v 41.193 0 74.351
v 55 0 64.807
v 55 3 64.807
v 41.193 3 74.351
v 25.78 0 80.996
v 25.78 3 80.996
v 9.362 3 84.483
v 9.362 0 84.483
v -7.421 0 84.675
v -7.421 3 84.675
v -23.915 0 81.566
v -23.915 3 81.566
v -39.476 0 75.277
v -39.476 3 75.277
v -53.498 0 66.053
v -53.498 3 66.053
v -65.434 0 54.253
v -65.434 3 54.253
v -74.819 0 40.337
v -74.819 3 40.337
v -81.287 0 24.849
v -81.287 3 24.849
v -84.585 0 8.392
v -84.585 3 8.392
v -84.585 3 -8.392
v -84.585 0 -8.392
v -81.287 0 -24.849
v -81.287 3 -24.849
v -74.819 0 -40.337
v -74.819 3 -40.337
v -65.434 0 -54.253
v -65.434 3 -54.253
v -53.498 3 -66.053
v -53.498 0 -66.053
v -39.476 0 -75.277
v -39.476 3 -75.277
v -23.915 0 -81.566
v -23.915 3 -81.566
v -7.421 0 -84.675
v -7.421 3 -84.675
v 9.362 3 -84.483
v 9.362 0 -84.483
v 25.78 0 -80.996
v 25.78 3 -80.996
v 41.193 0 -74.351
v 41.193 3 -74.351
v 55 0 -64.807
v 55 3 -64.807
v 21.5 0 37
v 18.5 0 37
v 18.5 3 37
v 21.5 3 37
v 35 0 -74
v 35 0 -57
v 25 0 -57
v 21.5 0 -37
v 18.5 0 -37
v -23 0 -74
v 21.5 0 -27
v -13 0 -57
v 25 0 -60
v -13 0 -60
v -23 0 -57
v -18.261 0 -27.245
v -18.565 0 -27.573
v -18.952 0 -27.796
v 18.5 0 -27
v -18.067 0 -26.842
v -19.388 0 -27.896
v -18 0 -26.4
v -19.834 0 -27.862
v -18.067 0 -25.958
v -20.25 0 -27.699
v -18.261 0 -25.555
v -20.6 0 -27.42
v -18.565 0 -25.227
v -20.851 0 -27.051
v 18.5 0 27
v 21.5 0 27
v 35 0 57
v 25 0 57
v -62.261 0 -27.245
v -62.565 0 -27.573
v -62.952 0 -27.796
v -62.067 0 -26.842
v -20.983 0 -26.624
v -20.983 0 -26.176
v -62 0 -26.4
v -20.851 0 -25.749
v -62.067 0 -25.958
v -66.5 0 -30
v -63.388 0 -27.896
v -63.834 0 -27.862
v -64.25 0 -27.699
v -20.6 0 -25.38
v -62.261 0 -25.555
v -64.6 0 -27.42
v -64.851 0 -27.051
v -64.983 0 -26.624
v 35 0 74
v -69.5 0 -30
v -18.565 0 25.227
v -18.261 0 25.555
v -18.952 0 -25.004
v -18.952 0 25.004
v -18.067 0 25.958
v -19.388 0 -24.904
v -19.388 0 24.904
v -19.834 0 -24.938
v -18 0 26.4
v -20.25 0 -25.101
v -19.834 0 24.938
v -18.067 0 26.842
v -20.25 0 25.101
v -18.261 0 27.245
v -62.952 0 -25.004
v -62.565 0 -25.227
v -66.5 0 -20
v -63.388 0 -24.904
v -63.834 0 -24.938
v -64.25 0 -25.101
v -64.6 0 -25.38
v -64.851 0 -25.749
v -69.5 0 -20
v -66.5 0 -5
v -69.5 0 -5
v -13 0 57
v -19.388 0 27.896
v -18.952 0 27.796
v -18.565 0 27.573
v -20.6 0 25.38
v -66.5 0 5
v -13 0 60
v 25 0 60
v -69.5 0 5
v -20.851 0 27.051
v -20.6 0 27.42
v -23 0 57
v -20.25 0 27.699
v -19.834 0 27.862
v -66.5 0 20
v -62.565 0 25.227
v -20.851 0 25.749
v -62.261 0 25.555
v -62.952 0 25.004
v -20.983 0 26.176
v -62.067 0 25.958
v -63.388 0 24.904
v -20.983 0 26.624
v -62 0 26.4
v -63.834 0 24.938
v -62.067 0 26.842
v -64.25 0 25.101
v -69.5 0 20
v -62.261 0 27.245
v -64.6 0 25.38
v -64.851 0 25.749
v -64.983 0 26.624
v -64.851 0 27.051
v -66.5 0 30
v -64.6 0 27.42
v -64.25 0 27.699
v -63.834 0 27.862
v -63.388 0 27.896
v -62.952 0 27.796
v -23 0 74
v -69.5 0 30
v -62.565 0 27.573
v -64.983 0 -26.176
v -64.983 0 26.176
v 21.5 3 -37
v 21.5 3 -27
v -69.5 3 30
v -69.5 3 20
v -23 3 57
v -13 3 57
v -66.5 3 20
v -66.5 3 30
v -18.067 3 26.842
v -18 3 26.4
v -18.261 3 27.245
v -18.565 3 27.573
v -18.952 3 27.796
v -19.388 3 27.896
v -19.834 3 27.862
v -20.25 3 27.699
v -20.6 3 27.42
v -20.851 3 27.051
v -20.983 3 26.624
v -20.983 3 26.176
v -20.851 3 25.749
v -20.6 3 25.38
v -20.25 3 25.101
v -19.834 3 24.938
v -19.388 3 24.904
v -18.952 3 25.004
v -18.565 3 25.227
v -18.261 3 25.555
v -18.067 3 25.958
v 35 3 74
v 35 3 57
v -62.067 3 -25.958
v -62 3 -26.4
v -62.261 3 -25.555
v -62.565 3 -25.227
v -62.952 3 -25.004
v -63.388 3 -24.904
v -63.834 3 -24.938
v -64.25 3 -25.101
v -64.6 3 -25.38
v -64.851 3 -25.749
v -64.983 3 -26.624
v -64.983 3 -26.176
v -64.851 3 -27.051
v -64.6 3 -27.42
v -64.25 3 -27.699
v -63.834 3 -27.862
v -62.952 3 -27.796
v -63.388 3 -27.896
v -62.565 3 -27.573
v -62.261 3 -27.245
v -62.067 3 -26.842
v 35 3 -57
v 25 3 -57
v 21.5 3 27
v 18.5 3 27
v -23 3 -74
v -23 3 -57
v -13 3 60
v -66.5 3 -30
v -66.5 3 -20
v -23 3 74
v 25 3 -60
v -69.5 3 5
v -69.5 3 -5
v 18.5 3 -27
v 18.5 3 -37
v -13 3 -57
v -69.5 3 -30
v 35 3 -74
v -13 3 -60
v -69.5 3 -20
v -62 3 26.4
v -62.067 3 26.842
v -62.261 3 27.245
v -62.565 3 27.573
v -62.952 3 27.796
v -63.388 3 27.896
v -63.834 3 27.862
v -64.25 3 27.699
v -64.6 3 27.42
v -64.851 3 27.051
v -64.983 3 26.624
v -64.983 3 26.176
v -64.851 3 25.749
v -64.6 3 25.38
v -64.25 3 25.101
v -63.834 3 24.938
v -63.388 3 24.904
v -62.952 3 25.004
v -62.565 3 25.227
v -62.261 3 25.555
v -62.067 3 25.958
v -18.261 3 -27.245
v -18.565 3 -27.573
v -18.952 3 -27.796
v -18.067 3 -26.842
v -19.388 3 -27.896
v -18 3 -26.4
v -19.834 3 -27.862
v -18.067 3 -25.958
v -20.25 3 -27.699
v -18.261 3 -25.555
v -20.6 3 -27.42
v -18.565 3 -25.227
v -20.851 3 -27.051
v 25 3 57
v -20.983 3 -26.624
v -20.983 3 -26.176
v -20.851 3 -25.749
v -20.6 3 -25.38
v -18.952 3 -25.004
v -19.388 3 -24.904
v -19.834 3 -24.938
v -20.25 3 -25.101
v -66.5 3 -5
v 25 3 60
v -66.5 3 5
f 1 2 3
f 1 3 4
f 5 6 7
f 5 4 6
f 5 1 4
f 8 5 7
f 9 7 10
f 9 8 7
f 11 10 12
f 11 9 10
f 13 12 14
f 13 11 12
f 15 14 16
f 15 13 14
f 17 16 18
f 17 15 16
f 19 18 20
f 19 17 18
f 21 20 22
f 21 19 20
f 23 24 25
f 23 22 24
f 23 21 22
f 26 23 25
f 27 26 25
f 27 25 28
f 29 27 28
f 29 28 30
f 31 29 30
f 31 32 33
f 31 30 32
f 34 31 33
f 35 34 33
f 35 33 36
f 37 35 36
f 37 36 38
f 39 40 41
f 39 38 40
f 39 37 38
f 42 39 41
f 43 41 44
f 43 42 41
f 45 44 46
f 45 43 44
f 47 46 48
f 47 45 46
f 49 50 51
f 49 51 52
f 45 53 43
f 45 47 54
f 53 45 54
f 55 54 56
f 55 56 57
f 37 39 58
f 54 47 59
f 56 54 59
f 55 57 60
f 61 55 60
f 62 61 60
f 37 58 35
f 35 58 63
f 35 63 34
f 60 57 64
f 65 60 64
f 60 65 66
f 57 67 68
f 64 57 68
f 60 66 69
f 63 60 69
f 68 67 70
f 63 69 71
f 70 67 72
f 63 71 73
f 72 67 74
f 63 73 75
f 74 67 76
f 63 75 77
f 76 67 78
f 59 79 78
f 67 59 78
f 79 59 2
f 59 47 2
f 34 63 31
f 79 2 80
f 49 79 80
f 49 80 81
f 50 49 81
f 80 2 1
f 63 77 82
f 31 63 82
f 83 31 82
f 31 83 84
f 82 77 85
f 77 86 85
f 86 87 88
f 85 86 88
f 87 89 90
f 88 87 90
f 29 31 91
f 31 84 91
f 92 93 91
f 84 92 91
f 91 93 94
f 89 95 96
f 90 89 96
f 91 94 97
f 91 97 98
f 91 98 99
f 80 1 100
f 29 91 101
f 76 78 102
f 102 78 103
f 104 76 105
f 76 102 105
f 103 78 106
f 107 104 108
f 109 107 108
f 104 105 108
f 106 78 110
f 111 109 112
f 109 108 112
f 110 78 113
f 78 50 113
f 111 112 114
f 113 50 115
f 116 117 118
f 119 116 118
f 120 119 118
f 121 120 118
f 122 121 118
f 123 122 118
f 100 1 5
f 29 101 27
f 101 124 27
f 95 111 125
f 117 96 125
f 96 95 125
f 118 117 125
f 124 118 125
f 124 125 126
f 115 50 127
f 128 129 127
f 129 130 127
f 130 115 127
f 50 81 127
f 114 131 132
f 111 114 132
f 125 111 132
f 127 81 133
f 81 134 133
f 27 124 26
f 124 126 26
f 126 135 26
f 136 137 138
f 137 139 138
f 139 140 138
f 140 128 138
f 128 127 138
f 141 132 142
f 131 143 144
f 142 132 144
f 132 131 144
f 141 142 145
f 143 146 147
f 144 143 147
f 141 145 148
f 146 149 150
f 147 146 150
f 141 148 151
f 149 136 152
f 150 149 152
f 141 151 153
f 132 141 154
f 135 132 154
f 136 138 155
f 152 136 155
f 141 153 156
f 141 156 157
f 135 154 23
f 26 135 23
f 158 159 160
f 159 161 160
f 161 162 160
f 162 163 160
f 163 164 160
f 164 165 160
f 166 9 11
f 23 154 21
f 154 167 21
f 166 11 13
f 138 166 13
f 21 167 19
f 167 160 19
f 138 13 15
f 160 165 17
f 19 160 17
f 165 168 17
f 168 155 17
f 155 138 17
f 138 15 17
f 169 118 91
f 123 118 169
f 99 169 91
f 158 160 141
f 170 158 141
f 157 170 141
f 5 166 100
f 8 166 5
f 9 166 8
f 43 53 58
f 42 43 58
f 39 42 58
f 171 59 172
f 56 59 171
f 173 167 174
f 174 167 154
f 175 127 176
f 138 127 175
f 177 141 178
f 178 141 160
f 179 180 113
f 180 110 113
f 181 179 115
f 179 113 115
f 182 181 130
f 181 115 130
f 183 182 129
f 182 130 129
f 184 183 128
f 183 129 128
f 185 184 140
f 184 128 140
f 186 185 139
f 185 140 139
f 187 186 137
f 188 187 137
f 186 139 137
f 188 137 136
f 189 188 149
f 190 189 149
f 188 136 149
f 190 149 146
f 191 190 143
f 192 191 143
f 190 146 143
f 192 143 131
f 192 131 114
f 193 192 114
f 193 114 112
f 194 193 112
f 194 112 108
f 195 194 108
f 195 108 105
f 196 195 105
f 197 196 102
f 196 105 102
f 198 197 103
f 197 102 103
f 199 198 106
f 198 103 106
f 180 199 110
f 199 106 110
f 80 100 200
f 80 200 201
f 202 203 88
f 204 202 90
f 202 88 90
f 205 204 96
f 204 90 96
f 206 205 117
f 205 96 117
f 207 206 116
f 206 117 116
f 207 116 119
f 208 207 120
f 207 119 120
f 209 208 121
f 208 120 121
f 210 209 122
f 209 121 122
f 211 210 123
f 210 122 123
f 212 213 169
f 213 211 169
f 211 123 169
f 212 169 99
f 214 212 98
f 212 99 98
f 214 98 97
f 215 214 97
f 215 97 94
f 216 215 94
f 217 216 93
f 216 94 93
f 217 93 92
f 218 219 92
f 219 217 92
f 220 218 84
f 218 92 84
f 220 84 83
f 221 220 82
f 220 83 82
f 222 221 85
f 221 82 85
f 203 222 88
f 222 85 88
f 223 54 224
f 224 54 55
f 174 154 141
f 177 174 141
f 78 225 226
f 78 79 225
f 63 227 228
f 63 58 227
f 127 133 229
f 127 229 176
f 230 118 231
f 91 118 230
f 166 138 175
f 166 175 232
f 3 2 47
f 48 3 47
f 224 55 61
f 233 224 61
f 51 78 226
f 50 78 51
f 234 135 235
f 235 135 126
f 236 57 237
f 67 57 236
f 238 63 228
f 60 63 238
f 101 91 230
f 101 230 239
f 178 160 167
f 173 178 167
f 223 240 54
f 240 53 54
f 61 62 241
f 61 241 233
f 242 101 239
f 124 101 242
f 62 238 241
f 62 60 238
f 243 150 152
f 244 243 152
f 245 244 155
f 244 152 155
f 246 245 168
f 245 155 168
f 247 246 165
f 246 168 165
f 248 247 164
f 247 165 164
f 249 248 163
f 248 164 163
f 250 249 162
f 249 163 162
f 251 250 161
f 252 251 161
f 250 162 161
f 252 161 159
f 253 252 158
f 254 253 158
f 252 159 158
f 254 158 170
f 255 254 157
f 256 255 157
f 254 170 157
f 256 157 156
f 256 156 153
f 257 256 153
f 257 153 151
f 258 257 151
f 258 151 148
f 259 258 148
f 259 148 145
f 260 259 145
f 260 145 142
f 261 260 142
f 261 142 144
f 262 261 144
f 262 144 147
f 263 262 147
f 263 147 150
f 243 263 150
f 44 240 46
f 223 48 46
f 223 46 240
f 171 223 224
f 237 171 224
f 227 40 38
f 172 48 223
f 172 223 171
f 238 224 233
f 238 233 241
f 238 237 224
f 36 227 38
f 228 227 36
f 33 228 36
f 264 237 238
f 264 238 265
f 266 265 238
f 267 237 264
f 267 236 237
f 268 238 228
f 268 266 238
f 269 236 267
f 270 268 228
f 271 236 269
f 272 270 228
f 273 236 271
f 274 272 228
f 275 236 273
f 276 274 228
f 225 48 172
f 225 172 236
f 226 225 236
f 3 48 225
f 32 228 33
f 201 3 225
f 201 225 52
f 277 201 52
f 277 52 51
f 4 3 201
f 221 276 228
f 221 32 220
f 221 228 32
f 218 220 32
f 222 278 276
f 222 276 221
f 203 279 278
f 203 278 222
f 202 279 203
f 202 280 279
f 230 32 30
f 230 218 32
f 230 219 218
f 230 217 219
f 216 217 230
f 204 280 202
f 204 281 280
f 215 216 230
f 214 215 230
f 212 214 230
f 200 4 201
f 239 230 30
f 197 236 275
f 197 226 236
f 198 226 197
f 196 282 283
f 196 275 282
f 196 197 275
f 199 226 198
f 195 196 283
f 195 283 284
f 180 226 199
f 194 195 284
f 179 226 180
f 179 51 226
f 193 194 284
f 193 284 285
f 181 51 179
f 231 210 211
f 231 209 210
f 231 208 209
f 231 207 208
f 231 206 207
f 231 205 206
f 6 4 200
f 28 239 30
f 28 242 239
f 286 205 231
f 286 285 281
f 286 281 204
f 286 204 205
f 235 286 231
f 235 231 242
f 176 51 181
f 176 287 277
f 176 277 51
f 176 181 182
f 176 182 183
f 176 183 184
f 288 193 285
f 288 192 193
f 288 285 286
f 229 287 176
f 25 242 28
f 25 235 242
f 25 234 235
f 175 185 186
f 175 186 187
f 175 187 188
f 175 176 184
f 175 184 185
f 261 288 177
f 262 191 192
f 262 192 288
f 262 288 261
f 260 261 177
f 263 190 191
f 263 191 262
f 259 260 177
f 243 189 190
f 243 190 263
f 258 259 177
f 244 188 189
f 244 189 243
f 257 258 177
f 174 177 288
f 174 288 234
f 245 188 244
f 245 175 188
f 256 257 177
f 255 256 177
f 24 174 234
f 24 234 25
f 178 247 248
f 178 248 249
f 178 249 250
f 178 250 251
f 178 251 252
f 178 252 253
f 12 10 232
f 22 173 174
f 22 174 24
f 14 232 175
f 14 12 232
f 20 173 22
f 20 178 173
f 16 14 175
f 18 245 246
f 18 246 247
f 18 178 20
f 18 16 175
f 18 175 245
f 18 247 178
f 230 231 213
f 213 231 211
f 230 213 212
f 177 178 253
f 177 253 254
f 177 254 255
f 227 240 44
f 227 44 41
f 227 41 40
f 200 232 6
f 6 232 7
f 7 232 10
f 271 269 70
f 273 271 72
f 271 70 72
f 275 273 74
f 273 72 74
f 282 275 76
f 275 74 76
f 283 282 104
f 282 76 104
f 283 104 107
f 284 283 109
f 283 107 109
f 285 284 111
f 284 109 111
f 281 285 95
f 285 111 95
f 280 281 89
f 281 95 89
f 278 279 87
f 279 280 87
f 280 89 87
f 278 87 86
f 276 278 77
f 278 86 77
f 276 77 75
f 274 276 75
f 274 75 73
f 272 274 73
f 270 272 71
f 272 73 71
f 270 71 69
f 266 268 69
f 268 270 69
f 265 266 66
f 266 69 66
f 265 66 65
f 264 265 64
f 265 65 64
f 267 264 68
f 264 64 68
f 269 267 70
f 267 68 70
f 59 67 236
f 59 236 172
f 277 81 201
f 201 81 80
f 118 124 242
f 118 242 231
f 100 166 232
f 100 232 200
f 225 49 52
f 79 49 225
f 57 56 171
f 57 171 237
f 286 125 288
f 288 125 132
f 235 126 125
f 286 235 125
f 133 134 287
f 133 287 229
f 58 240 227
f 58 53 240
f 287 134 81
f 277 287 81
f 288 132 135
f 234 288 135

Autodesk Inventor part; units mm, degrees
ref_plane "YZ Plane" through (0, 0, 0) normal (1, 0, 0) x (0, 1, 0)
ref_plane "XZ Plane" through (0, 0, 0) normal (0, 1, 0) x (-1, 0, 0)
ref_plane "XY Plane" through (0, 0, 0) normal (0, 0, 1) x (1, 0, 0)
sketch "Sketch1" plane through (0, 0, 0) normal (0, 1, 0) x (-1, 0, 0)
  circle A0 centre (0, 0) radius 85 construction
  line L0 (-55, 64.8074) -> (-55, -64.8074) construction
  line L1 (-35, 74) -> (23, 74) construction
  line L2 (23, 74) -> (23, 60) construction
  line L3 (23, 60) -> (-35, 60) construction
  line L4 (-35, 60) -> (-35, 74) construction
  line L5 (-35, -60) -> (23, -60) construction
  line L6 (23, -60) -> (23, -74) construction
  line L7 (23, -74) -> (-35, -74) construction
  line L8 (-35, -74) -> (-35, -60) construction
  line L9 (-6, 60) -> (-6, -60)
  line L10 (6.5, 5) -> (-18.5, 5) construction
  line L11 (-18.5, 5) -> (-18.5, 57) construction
  line L12 (-18.5, 57) -> (6.5, 57) construction
  line L13 (6.5, 57) -> (6.5, 5) construction
  line L14 (6.5, 5) -> (-18.5, 57) construction
  line L15 (-18.5, 5) -> (6.5, 57) construction
  line L16 (6.5, -57) -> (-18.5, -57) construction
  line L17 (-18.5, -57) -> (-18.5, -5) construction
  line L18 (-18.5, -5) -> (6.5, -5) construction
  line L19 (6.5, -5) -> (6.5, -57) construction
  line L20 (6.5, -57) -> (-18.5, -5) construction
  line L21 (-18.5, -57) -> (6.5, -5) construction
  line L22 (66.5, -30) -> (16.5, -30) construction
  line L23 (16.5, -30) -> (16.5, 30) construction
  line L24 (16.5, 30) -> (66.5, 30) construction
  line L25 (66.5, 30) -> (66.5, -30) construction
  line L26 (66.5, -30) -> (16.5, 30) construction
  line L27 (16.5, -30) -> (66.5, 30) construction
  point P0 (-6, 31)
  point P1 (-6, -31)
  point P2 (41.5, 0)
  point P3 (-6, 0)
  point P4 (41.5, 0)
  dimension "d0" = 170
  dimension "d1" = 55
  dimension "d2" = 58
  dimension "d3" = 14
  dimension "d4" = 60
  dimension "d5" = 20
  dimension "d6" = 60
  dimension "d7" = 25
  dimension "d8" = 52
  dimension "d9" = 3
  dimension "d10" = 3
  dimension "d11" = 10
  dimension "d12" = 50
  dimension "d13" = 60
  dimension "d14" = 10
sketch "Sketch2" plane through (0, 0, 0) normal (0, 1, 0) x (-1, 0, 0)
  circle A0 centre (0, 0) radius 85 construction
  line L0 (-55, 64.8074) -> (-55, -64.8074) construction
  arc A1 (-55, -64.8074) -> (-55, 64.8074) centre (0, 0) ccw
  line L1 (-55, 64.8074) -> (-55, -64.8074)
extrude "Extrusion1" add sketch "Sketch2" along normal blind 3
sketch "Sketch3" plane through (0, 0, 0) normal (0, -1, 0) x (1, 0, 0)
  line L0 (-23, 74) -> (35, 74)
  line L1 (35, 74) -> (35, 60)
  line L2 (35, 60) -> (-23, 60)
  line L3 (-23, 60) -> (-23, 74)
  point P0 (0, 0)
extrude "Extrusion2" cut sketch "Sketch3" against normal blind 3
sketch "Sketch4" plane through (0, 0, 0) normal (0, -1, 0) x (1, 0, 0)
  line L0 (-23, 60) -> (-13, 60)
  line L1 (-13, 60) -> (-13, 57)
  line L2 (-13, 57) -> (-23, 57)
  line L3 (-23, 57) -> (-23, 60)
  line L4 (35, 60) -> (25, 60)
  line L5 (25, 60) -> (25, 57)
  line L6 (25, 57) -> (35, 57)
  line L7 (35, 57) -> (35, 60)
  point P0 (0, 0)
  dimension "d19" = 10
  dimension "d20" = 3
  dimension "d21" = 10
  dimension "d22" = 3
extrude "Extrusion3" cut sketch "Sketch4" against normal blind 3
sketch "Sketch5" plane through (0, 0, 0) normal (0, -1, 0) x (1, 0, 0)
  line L0 (18.5, 5) -> (18.5, 57) construction
  line L1 (18.5, 37) -> (21.5, 37)
  line L2 (21.5, 37) -> (21.5, 27)
  line L3 (21.5, 27) -> (18.5, 27)
  line L4 (18.5, 27) -> (18.5, 37)
  line L5 (35, 57) -> (25, 57) projected
  point P0 (0, 0)
  dimension "d25" = 3
  dimension "d26" = 10
  dimension "d27" = 20
extrude "Extrusion4" cut sketch "Sketch5" against normal blind 3
sketch "Sketch6" plane through (0, 0, 0) normal (0, -1, 0) x (1, 0, 0)
  line L0 (-66.5, 30) -> (-66.5, -30) construction
  line L1 (-66.5, 30) -> (-69.5, 30)
  line L2 (-69.5, 30) -> (-69.5, 20)
  line L3 (-69.5, 20) -> (-66.5, 20)
  line L4 (-66.5, 20) -> (-66.5, 30)
  line L5 (-66.5, 5) -> (-69.5, 5)
  line L6 (-69.5, 5) -> (-69.5, -5)
  line L7 (-69.5, -5) -> (-66.5, -5)
  line L8 (-66.5, -5) -> (-66.5, 5)
  line L9 (-66.5, -30) -> (-69.5, -30)
  line L10 (-69.5, -30) -> (-69.5, -20)
  line L11 (-69.5, -20) -> (-66.5, -20)
  line L12 (-66.5, -20) -> (-66.5, -30)
  point P0 (0, 0)
  point P1 (-69.5, 0)
  point P2 (-66.5, 0)
  dimension "d30" = 3
  dimension "d31" = 10
  dimension "d32" = 3
  dimension "d33" = 10
  dimension "d34" = 3
  dimension "d35" = 10
extrude "Extrusion5" cut sketch "Sketch6" against normal blind 3
sketch "Sketch7" plane through (0, 0, 0) normal (0, -1, 0) x (1, 0, 0)
  line L0 (-16.5, -30) -> (-66.5, 30) construction
  line L1 (-63.5, 26.4) -> (-19.5, 26.4)
  line L2 (-19.5, 26.4) -> (-19.5, -26.4)
  line L3 (-19.5, -26.4) -> (-63.5, -26.4)
  line L4 (-63.5, -26.4) -> (-63.5, 26.4)
  line L5 (-63.5, 26.4) -> (-19.5, -26.4) construction
  line L6 (-19.5, 26.4) -> (-63.5, -26.4) construction
  line L7 (-16.5, -30) -> (-16.5, 30) construction
  circle A0 centre (-19.5, 26.4) radius 1.5
  circle A1 centre (-19.5, -26.4) radius 1.5
  circle A2 centre (-63.5, 26.4) radius 1.5
  circle A3 centre (-63.5, -26.4) radius 1.5
  point P0 (0, 0)
  point P1 (-41.5, 0)
  dimension "d38" = 3
  dimension "d39" = 3
  dimension "d40" = 3
  dimension "d41" = 3
  dimension "d42" = 3
extrude "Extrusion6" cut sketch "Sketch7" against normal blind 3 contours L4 A2 L1 | L1 A2 L4 | A0 L2 L1 | L1 L2 A0
mirror "Mirror1" about plane through (0, 0, 0) normal (0, 0, 1) of "Extrusion2", "Extrusion3", "Extrusion4", "Extrusion6"
equation "\"d6\" = d4"
equation "\"d10\" = d9"
properties part number "Base Plate"
